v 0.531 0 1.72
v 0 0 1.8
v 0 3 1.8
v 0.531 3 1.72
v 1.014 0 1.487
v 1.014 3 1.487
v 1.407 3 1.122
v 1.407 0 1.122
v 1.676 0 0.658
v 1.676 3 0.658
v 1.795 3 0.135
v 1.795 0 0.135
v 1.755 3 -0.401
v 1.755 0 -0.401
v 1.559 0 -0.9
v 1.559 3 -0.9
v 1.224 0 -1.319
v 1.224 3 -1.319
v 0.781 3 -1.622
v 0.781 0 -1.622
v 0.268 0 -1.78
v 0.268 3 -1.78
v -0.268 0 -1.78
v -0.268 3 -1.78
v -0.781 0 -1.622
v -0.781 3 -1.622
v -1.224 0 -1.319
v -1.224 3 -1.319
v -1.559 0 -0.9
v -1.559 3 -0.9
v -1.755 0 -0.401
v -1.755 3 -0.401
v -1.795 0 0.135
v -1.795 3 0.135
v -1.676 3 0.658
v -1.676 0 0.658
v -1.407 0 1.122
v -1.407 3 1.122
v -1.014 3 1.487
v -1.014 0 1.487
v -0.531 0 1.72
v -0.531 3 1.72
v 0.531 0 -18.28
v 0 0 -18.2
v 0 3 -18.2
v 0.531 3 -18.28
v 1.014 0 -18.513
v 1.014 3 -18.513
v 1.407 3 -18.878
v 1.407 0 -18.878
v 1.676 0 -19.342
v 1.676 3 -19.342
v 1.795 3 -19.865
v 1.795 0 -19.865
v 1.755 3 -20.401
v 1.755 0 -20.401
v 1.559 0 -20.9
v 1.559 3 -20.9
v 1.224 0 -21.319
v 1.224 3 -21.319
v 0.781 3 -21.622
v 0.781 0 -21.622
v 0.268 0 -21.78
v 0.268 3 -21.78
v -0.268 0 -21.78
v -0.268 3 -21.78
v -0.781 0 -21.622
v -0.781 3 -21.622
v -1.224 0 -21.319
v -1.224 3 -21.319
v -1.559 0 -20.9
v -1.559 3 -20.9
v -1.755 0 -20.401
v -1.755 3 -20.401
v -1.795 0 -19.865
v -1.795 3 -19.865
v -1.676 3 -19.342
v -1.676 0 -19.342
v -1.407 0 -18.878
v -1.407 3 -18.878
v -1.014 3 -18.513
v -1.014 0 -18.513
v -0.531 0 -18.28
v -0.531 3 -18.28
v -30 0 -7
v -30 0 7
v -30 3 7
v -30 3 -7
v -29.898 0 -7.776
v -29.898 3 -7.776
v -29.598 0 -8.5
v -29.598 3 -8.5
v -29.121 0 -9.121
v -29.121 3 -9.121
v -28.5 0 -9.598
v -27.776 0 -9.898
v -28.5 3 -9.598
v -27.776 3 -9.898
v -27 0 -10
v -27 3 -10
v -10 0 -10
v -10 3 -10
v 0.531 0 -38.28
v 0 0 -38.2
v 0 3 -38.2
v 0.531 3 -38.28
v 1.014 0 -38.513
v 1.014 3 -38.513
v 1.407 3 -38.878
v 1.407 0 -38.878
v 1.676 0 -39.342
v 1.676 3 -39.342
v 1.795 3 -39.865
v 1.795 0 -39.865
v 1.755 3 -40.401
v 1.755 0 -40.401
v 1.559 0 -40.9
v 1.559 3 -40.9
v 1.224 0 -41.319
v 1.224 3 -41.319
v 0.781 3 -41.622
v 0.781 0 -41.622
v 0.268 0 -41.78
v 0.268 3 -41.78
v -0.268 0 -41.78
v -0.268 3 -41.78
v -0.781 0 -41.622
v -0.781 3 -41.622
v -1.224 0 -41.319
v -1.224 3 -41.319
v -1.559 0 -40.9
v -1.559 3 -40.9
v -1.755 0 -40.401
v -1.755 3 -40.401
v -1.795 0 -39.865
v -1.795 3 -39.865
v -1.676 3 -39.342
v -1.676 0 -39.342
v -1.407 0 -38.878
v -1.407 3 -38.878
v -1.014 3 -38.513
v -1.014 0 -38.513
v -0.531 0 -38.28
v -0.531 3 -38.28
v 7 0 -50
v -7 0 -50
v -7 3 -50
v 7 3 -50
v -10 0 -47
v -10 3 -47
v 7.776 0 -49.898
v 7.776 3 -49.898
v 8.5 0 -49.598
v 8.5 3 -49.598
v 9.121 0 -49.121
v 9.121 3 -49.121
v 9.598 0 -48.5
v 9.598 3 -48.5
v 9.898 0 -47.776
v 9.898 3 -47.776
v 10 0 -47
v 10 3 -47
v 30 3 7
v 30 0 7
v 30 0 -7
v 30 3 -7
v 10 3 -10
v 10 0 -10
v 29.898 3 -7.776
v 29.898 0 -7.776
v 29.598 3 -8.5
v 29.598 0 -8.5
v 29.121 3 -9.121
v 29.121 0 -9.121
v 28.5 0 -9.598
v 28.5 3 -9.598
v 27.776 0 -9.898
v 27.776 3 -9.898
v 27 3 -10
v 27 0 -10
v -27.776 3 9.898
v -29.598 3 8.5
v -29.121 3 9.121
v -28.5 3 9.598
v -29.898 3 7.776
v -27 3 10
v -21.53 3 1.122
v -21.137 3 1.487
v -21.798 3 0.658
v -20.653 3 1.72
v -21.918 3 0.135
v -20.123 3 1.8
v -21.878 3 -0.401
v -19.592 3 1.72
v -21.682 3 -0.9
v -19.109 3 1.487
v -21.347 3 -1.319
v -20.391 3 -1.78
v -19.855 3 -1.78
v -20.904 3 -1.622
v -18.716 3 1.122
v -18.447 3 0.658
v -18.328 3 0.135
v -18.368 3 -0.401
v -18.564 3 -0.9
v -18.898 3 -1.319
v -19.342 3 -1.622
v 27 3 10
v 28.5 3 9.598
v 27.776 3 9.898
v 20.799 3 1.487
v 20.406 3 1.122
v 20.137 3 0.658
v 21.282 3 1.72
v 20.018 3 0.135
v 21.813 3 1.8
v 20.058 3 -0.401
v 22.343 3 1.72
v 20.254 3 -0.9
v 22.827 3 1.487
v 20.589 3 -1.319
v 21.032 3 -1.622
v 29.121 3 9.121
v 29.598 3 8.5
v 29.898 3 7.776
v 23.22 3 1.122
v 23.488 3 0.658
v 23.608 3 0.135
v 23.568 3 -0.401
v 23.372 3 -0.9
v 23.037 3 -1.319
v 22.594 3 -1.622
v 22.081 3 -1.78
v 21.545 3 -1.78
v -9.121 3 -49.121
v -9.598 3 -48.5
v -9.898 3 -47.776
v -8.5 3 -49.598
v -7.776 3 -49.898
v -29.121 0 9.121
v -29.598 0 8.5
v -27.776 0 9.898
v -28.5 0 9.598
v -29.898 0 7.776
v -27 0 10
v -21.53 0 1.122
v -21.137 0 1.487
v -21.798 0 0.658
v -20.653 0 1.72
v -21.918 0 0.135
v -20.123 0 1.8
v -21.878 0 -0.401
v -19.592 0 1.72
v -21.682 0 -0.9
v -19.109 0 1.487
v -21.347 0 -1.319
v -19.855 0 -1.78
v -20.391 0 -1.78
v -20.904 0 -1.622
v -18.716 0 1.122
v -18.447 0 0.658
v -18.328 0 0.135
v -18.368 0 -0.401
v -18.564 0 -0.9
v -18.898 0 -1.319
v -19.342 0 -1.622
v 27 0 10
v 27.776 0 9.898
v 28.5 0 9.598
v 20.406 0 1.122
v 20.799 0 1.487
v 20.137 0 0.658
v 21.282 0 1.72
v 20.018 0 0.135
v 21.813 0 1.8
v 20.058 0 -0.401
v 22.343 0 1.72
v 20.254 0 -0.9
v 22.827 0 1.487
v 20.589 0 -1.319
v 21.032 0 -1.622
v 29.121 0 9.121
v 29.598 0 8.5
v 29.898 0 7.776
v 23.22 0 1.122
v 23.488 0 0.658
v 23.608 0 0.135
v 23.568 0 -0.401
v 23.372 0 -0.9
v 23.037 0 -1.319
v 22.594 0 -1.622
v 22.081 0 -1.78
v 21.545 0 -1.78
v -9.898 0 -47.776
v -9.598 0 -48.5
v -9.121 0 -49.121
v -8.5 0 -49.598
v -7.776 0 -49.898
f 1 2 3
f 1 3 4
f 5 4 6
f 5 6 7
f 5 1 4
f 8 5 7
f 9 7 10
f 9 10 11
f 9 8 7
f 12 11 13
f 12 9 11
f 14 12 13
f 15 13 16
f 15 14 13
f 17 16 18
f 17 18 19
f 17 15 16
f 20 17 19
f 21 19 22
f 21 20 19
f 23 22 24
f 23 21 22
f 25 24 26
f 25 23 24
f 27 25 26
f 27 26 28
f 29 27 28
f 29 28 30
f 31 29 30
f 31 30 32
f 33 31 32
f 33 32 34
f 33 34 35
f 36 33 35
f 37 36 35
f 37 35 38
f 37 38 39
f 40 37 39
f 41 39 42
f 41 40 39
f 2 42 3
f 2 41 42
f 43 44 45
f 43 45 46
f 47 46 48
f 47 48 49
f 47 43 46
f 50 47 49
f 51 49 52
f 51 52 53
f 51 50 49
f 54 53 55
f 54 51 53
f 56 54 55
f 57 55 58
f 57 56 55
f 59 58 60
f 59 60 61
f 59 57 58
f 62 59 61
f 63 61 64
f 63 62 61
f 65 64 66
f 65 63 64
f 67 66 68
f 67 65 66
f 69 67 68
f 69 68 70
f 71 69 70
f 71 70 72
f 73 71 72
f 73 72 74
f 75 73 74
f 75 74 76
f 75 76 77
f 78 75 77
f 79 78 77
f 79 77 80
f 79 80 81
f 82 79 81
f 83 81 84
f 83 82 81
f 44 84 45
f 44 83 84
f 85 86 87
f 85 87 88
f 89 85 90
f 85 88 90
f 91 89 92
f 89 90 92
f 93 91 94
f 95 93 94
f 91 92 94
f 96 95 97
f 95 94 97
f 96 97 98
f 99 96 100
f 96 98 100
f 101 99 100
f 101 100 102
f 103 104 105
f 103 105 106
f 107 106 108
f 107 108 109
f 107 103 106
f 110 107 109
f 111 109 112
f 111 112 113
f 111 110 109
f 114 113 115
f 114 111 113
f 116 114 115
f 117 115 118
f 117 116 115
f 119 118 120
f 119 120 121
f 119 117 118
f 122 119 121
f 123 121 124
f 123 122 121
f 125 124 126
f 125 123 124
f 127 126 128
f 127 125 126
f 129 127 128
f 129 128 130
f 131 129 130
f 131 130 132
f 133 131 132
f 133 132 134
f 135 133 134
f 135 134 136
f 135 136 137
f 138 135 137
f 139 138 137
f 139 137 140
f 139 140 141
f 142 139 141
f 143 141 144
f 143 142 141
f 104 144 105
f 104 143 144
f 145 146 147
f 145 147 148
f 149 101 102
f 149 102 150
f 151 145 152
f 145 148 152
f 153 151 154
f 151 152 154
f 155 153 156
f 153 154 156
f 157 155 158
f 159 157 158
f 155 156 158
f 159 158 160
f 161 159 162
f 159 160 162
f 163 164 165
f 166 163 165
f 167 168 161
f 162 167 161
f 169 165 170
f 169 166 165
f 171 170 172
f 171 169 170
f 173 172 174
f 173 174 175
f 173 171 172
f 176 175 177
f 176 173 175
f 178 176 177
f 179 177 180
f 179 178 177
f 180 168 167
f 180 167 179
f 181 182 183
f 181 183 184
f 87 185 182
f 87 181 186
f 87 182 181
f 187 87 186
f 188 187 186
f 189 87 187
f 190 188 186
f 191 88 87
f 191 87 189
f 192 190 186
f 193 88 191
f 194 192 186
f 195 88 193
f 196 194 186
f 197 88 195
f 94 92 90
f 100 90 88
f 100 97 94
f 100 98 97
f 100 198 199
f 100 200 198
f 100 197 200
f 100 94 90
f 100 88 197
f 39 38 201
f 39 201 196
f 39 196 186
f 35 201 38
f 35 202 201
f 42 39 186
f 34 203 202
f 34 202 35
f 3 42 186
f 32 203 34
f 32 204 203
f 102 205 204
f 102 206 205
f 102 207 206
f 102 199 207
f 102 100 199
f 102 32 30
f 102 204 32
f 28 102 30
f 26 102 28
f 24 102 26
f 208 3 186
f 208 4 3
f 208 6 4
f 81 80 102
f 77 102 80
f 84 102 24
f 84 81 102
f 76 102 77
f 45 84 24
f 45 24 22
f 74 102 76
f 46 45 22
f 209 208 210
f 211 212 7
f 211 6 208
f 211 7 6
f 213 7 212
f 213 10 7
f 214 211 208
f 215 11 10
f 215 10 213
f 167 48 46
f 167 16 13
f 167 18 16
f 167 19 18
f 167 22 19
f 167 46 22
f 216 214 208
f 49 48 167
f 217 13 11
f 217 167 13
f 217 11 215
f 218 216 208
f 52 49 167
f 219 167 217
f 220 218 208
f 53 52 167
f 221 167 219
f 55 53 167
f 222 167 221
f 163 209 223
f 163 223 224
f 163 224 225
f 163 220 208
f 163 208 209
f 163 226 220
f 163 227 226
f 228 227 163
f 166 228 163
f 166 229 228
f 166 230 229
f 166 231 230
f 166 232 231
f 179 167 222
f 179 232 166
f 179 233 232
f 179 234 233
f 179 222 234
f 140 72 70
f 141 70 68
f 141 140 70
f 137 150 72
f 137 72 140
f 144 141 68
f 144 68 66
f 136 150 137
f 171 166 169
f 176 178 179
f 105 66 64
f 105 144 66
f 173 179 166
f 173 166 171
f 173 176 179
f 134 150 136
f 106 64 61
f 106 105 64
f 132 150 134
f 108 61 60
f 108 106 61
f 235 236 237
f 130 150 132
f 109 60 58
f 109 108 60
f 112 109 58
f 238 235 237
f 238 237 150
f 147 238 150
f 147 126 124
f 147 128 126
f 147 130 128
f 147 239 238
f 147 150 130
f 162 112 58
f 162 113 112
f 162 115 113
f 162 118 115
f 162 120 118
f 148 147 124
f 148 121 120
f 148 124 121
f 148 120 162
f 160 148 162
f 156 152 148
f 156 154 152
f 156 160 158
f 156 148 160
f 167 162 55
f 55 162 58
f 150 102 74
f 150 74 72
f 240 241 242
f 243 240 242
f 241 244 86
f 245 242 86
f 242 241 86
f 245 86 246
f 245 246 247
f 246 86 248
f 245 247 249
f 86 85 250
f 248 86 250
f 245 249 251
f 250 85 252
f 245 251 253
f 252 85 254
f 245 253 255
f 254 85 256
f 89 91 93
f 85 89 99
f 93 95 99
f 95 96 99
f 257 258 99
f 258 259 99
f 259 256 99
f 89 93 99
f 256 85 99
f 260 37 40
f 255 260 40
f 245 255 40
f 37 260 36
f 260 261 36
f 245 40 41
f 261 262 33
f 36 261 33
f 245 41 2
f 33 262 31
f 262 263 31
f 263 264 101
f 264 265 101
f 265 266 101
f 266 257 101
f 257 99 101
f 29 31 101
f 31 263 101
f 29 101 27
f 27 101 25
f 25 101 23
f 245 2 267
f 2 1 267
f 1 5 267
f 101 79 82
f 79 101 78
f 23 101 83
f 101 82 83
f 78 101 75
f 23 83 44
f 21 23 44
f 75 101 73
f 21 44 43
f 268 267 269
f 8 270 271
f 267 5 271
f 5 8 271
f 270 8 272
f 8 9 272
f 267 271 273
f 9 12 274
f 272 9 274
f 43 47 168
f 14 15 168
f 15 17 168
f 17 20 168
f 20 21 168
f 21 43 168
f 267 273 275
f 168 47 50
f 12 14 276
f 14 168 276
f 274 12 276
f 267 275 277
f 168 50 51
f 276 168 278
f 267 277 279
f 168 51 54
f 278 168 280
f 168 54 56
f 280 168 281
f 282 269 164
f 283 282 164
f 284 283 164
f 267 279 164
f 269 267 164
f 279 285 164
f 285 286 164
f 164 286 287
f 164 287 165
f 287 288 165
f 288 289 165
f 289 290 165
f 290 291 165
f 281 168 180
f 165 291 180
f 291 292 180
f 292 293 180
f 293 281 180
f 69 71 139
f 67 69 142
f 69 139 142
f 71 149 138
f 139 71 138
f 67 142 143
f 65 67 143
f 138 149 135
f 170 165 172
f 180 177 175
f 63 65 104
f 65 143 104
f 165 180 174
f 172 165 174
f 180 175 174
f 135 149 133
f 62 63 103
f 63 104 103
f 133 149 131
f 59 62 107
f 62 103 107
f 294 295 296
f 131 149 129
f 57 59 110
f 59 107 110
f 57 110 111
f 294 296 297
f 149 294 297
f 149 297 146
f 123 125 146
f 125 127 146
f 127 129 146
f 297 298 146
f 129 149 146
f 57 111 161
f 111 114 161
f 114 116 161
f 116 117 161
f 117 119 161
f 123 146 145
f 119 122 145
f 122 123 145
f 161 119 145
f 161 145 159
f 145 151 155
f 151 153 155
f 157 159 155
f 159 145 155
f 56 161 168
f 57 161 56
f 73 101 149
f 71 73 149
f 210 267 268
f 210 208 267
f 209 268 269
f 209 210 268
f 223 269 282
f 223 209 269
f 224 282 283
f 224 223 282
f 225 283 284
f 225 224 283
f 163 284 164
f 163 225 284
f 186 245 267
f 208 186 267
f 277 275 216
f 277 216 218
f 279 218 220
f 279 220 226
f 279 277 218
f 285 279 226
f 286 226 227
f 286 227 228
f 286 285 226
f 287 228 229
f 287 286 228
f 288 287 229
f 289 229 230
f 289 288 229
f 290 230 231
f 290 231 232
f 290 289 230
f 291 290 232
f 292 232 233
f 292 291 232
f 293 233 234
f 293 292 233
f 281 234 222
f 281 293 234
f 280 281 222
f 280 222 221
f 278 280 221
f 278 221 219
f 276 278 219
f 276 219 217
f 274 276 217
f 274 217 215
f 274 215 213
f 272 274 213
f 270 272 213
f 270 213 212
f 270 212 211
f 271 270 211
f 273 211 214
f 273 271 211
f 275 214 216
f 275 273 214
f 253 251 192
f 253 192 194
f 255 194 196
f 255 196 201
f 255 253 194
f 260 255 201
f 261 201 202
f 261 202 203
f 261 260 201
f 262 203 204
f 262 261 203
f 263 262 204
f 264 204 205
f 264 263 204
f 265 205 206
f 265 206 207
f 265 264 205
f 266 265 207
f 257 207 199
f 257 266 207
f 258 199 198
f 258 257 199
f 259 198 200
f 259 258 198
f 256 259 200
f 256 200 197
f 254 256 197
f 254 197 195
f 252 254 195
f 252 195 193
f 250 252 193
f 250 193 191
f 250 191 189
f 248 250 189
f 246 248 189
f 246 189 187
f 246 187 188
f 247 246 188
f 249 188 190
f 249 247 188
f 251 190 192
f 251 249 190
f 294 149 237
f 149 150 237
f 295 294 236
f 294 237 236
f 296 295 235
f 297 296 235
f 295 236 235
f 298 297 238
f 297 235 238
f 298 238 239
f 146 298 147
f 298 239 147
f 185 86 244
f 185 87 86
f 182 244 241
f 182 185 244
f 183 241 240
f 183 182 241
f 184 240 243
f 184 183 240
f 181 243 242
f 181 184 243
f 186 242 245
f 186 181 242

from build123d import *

# Parameters (mm, degrees)
SKETCH_2_W      = 20
SKETCH_2_H      = 40
SKETCH_2_R      = 1.8
SKETCH_2_W_2    = 60
SKETCH_2_H_2    = 20
EXTRUDE_1_DEPTH = 3
FILLET_1_R      = 3


with BuildPart() as part:
    # 草图2 → 凸台-拉伸1 (new body)
    # profile 1 of 2: a face of its own
    with BuildSketch(Plane(origin=(0, 0, 0), x_dir=(1, 0, 0), z_dir=(0, 1, 0))):
        with Locations((0, 30)):
            Rectangle(SKETCH_2_W, SKETCH_2_H)
        with Locations(Location((0, 20, 0), (0, 0, 270))):
            Circle(SKETCH_2_R, mode=Mode.SUBTRACT)
        with Locations(Location((0, 40, 0), (0, 0, 270))):
            Circle(SKETCH_2_R, mode=Mode.SUBTRACT)
    # profile 2 of 2: a face of its own
    with BuildSketch(Plane(origin=(0, 0, 0), x_dir=(1, 0, 0), z_dir=(0, 1, 0))):
        Rectangle(SKETCH_2_W_2, SKETCH_2_H_2)
        with Locations(Location((0, 0, 0), (0, 0, 270))):
            Circle(SKETCH_2_R, mode=Mode.SUBTRACT)
        with Locations(Location((-20.122806929, 0, 0), (0, 0, 270))):
            Circle(SKETCH_2_R, mode=Mode.SUBTRACT)
        with Locations(Location((21.812825763, 0, 0), (0, 0, 270))):
            Circle(SKETCH_2_R, mode=Mode.SUBTRACT)
    extrude(amount=EXTRUDE_1_DEPTH)

    # 圆角1
    fillet_1_edges = [part.edges().sort_by_distance(p)[0] for p in [
        (30, 1.5, -10),
        (30, 1.5, 10),
        (-30, 1.5, 10),
        (-30, 1.5, -10),
        (-10, 1.5, -50),
        (10, 1.5, -50),
    ]]
    fillet(fillet_1_edges, radius=FILLET_1_R)


solid = part.part
